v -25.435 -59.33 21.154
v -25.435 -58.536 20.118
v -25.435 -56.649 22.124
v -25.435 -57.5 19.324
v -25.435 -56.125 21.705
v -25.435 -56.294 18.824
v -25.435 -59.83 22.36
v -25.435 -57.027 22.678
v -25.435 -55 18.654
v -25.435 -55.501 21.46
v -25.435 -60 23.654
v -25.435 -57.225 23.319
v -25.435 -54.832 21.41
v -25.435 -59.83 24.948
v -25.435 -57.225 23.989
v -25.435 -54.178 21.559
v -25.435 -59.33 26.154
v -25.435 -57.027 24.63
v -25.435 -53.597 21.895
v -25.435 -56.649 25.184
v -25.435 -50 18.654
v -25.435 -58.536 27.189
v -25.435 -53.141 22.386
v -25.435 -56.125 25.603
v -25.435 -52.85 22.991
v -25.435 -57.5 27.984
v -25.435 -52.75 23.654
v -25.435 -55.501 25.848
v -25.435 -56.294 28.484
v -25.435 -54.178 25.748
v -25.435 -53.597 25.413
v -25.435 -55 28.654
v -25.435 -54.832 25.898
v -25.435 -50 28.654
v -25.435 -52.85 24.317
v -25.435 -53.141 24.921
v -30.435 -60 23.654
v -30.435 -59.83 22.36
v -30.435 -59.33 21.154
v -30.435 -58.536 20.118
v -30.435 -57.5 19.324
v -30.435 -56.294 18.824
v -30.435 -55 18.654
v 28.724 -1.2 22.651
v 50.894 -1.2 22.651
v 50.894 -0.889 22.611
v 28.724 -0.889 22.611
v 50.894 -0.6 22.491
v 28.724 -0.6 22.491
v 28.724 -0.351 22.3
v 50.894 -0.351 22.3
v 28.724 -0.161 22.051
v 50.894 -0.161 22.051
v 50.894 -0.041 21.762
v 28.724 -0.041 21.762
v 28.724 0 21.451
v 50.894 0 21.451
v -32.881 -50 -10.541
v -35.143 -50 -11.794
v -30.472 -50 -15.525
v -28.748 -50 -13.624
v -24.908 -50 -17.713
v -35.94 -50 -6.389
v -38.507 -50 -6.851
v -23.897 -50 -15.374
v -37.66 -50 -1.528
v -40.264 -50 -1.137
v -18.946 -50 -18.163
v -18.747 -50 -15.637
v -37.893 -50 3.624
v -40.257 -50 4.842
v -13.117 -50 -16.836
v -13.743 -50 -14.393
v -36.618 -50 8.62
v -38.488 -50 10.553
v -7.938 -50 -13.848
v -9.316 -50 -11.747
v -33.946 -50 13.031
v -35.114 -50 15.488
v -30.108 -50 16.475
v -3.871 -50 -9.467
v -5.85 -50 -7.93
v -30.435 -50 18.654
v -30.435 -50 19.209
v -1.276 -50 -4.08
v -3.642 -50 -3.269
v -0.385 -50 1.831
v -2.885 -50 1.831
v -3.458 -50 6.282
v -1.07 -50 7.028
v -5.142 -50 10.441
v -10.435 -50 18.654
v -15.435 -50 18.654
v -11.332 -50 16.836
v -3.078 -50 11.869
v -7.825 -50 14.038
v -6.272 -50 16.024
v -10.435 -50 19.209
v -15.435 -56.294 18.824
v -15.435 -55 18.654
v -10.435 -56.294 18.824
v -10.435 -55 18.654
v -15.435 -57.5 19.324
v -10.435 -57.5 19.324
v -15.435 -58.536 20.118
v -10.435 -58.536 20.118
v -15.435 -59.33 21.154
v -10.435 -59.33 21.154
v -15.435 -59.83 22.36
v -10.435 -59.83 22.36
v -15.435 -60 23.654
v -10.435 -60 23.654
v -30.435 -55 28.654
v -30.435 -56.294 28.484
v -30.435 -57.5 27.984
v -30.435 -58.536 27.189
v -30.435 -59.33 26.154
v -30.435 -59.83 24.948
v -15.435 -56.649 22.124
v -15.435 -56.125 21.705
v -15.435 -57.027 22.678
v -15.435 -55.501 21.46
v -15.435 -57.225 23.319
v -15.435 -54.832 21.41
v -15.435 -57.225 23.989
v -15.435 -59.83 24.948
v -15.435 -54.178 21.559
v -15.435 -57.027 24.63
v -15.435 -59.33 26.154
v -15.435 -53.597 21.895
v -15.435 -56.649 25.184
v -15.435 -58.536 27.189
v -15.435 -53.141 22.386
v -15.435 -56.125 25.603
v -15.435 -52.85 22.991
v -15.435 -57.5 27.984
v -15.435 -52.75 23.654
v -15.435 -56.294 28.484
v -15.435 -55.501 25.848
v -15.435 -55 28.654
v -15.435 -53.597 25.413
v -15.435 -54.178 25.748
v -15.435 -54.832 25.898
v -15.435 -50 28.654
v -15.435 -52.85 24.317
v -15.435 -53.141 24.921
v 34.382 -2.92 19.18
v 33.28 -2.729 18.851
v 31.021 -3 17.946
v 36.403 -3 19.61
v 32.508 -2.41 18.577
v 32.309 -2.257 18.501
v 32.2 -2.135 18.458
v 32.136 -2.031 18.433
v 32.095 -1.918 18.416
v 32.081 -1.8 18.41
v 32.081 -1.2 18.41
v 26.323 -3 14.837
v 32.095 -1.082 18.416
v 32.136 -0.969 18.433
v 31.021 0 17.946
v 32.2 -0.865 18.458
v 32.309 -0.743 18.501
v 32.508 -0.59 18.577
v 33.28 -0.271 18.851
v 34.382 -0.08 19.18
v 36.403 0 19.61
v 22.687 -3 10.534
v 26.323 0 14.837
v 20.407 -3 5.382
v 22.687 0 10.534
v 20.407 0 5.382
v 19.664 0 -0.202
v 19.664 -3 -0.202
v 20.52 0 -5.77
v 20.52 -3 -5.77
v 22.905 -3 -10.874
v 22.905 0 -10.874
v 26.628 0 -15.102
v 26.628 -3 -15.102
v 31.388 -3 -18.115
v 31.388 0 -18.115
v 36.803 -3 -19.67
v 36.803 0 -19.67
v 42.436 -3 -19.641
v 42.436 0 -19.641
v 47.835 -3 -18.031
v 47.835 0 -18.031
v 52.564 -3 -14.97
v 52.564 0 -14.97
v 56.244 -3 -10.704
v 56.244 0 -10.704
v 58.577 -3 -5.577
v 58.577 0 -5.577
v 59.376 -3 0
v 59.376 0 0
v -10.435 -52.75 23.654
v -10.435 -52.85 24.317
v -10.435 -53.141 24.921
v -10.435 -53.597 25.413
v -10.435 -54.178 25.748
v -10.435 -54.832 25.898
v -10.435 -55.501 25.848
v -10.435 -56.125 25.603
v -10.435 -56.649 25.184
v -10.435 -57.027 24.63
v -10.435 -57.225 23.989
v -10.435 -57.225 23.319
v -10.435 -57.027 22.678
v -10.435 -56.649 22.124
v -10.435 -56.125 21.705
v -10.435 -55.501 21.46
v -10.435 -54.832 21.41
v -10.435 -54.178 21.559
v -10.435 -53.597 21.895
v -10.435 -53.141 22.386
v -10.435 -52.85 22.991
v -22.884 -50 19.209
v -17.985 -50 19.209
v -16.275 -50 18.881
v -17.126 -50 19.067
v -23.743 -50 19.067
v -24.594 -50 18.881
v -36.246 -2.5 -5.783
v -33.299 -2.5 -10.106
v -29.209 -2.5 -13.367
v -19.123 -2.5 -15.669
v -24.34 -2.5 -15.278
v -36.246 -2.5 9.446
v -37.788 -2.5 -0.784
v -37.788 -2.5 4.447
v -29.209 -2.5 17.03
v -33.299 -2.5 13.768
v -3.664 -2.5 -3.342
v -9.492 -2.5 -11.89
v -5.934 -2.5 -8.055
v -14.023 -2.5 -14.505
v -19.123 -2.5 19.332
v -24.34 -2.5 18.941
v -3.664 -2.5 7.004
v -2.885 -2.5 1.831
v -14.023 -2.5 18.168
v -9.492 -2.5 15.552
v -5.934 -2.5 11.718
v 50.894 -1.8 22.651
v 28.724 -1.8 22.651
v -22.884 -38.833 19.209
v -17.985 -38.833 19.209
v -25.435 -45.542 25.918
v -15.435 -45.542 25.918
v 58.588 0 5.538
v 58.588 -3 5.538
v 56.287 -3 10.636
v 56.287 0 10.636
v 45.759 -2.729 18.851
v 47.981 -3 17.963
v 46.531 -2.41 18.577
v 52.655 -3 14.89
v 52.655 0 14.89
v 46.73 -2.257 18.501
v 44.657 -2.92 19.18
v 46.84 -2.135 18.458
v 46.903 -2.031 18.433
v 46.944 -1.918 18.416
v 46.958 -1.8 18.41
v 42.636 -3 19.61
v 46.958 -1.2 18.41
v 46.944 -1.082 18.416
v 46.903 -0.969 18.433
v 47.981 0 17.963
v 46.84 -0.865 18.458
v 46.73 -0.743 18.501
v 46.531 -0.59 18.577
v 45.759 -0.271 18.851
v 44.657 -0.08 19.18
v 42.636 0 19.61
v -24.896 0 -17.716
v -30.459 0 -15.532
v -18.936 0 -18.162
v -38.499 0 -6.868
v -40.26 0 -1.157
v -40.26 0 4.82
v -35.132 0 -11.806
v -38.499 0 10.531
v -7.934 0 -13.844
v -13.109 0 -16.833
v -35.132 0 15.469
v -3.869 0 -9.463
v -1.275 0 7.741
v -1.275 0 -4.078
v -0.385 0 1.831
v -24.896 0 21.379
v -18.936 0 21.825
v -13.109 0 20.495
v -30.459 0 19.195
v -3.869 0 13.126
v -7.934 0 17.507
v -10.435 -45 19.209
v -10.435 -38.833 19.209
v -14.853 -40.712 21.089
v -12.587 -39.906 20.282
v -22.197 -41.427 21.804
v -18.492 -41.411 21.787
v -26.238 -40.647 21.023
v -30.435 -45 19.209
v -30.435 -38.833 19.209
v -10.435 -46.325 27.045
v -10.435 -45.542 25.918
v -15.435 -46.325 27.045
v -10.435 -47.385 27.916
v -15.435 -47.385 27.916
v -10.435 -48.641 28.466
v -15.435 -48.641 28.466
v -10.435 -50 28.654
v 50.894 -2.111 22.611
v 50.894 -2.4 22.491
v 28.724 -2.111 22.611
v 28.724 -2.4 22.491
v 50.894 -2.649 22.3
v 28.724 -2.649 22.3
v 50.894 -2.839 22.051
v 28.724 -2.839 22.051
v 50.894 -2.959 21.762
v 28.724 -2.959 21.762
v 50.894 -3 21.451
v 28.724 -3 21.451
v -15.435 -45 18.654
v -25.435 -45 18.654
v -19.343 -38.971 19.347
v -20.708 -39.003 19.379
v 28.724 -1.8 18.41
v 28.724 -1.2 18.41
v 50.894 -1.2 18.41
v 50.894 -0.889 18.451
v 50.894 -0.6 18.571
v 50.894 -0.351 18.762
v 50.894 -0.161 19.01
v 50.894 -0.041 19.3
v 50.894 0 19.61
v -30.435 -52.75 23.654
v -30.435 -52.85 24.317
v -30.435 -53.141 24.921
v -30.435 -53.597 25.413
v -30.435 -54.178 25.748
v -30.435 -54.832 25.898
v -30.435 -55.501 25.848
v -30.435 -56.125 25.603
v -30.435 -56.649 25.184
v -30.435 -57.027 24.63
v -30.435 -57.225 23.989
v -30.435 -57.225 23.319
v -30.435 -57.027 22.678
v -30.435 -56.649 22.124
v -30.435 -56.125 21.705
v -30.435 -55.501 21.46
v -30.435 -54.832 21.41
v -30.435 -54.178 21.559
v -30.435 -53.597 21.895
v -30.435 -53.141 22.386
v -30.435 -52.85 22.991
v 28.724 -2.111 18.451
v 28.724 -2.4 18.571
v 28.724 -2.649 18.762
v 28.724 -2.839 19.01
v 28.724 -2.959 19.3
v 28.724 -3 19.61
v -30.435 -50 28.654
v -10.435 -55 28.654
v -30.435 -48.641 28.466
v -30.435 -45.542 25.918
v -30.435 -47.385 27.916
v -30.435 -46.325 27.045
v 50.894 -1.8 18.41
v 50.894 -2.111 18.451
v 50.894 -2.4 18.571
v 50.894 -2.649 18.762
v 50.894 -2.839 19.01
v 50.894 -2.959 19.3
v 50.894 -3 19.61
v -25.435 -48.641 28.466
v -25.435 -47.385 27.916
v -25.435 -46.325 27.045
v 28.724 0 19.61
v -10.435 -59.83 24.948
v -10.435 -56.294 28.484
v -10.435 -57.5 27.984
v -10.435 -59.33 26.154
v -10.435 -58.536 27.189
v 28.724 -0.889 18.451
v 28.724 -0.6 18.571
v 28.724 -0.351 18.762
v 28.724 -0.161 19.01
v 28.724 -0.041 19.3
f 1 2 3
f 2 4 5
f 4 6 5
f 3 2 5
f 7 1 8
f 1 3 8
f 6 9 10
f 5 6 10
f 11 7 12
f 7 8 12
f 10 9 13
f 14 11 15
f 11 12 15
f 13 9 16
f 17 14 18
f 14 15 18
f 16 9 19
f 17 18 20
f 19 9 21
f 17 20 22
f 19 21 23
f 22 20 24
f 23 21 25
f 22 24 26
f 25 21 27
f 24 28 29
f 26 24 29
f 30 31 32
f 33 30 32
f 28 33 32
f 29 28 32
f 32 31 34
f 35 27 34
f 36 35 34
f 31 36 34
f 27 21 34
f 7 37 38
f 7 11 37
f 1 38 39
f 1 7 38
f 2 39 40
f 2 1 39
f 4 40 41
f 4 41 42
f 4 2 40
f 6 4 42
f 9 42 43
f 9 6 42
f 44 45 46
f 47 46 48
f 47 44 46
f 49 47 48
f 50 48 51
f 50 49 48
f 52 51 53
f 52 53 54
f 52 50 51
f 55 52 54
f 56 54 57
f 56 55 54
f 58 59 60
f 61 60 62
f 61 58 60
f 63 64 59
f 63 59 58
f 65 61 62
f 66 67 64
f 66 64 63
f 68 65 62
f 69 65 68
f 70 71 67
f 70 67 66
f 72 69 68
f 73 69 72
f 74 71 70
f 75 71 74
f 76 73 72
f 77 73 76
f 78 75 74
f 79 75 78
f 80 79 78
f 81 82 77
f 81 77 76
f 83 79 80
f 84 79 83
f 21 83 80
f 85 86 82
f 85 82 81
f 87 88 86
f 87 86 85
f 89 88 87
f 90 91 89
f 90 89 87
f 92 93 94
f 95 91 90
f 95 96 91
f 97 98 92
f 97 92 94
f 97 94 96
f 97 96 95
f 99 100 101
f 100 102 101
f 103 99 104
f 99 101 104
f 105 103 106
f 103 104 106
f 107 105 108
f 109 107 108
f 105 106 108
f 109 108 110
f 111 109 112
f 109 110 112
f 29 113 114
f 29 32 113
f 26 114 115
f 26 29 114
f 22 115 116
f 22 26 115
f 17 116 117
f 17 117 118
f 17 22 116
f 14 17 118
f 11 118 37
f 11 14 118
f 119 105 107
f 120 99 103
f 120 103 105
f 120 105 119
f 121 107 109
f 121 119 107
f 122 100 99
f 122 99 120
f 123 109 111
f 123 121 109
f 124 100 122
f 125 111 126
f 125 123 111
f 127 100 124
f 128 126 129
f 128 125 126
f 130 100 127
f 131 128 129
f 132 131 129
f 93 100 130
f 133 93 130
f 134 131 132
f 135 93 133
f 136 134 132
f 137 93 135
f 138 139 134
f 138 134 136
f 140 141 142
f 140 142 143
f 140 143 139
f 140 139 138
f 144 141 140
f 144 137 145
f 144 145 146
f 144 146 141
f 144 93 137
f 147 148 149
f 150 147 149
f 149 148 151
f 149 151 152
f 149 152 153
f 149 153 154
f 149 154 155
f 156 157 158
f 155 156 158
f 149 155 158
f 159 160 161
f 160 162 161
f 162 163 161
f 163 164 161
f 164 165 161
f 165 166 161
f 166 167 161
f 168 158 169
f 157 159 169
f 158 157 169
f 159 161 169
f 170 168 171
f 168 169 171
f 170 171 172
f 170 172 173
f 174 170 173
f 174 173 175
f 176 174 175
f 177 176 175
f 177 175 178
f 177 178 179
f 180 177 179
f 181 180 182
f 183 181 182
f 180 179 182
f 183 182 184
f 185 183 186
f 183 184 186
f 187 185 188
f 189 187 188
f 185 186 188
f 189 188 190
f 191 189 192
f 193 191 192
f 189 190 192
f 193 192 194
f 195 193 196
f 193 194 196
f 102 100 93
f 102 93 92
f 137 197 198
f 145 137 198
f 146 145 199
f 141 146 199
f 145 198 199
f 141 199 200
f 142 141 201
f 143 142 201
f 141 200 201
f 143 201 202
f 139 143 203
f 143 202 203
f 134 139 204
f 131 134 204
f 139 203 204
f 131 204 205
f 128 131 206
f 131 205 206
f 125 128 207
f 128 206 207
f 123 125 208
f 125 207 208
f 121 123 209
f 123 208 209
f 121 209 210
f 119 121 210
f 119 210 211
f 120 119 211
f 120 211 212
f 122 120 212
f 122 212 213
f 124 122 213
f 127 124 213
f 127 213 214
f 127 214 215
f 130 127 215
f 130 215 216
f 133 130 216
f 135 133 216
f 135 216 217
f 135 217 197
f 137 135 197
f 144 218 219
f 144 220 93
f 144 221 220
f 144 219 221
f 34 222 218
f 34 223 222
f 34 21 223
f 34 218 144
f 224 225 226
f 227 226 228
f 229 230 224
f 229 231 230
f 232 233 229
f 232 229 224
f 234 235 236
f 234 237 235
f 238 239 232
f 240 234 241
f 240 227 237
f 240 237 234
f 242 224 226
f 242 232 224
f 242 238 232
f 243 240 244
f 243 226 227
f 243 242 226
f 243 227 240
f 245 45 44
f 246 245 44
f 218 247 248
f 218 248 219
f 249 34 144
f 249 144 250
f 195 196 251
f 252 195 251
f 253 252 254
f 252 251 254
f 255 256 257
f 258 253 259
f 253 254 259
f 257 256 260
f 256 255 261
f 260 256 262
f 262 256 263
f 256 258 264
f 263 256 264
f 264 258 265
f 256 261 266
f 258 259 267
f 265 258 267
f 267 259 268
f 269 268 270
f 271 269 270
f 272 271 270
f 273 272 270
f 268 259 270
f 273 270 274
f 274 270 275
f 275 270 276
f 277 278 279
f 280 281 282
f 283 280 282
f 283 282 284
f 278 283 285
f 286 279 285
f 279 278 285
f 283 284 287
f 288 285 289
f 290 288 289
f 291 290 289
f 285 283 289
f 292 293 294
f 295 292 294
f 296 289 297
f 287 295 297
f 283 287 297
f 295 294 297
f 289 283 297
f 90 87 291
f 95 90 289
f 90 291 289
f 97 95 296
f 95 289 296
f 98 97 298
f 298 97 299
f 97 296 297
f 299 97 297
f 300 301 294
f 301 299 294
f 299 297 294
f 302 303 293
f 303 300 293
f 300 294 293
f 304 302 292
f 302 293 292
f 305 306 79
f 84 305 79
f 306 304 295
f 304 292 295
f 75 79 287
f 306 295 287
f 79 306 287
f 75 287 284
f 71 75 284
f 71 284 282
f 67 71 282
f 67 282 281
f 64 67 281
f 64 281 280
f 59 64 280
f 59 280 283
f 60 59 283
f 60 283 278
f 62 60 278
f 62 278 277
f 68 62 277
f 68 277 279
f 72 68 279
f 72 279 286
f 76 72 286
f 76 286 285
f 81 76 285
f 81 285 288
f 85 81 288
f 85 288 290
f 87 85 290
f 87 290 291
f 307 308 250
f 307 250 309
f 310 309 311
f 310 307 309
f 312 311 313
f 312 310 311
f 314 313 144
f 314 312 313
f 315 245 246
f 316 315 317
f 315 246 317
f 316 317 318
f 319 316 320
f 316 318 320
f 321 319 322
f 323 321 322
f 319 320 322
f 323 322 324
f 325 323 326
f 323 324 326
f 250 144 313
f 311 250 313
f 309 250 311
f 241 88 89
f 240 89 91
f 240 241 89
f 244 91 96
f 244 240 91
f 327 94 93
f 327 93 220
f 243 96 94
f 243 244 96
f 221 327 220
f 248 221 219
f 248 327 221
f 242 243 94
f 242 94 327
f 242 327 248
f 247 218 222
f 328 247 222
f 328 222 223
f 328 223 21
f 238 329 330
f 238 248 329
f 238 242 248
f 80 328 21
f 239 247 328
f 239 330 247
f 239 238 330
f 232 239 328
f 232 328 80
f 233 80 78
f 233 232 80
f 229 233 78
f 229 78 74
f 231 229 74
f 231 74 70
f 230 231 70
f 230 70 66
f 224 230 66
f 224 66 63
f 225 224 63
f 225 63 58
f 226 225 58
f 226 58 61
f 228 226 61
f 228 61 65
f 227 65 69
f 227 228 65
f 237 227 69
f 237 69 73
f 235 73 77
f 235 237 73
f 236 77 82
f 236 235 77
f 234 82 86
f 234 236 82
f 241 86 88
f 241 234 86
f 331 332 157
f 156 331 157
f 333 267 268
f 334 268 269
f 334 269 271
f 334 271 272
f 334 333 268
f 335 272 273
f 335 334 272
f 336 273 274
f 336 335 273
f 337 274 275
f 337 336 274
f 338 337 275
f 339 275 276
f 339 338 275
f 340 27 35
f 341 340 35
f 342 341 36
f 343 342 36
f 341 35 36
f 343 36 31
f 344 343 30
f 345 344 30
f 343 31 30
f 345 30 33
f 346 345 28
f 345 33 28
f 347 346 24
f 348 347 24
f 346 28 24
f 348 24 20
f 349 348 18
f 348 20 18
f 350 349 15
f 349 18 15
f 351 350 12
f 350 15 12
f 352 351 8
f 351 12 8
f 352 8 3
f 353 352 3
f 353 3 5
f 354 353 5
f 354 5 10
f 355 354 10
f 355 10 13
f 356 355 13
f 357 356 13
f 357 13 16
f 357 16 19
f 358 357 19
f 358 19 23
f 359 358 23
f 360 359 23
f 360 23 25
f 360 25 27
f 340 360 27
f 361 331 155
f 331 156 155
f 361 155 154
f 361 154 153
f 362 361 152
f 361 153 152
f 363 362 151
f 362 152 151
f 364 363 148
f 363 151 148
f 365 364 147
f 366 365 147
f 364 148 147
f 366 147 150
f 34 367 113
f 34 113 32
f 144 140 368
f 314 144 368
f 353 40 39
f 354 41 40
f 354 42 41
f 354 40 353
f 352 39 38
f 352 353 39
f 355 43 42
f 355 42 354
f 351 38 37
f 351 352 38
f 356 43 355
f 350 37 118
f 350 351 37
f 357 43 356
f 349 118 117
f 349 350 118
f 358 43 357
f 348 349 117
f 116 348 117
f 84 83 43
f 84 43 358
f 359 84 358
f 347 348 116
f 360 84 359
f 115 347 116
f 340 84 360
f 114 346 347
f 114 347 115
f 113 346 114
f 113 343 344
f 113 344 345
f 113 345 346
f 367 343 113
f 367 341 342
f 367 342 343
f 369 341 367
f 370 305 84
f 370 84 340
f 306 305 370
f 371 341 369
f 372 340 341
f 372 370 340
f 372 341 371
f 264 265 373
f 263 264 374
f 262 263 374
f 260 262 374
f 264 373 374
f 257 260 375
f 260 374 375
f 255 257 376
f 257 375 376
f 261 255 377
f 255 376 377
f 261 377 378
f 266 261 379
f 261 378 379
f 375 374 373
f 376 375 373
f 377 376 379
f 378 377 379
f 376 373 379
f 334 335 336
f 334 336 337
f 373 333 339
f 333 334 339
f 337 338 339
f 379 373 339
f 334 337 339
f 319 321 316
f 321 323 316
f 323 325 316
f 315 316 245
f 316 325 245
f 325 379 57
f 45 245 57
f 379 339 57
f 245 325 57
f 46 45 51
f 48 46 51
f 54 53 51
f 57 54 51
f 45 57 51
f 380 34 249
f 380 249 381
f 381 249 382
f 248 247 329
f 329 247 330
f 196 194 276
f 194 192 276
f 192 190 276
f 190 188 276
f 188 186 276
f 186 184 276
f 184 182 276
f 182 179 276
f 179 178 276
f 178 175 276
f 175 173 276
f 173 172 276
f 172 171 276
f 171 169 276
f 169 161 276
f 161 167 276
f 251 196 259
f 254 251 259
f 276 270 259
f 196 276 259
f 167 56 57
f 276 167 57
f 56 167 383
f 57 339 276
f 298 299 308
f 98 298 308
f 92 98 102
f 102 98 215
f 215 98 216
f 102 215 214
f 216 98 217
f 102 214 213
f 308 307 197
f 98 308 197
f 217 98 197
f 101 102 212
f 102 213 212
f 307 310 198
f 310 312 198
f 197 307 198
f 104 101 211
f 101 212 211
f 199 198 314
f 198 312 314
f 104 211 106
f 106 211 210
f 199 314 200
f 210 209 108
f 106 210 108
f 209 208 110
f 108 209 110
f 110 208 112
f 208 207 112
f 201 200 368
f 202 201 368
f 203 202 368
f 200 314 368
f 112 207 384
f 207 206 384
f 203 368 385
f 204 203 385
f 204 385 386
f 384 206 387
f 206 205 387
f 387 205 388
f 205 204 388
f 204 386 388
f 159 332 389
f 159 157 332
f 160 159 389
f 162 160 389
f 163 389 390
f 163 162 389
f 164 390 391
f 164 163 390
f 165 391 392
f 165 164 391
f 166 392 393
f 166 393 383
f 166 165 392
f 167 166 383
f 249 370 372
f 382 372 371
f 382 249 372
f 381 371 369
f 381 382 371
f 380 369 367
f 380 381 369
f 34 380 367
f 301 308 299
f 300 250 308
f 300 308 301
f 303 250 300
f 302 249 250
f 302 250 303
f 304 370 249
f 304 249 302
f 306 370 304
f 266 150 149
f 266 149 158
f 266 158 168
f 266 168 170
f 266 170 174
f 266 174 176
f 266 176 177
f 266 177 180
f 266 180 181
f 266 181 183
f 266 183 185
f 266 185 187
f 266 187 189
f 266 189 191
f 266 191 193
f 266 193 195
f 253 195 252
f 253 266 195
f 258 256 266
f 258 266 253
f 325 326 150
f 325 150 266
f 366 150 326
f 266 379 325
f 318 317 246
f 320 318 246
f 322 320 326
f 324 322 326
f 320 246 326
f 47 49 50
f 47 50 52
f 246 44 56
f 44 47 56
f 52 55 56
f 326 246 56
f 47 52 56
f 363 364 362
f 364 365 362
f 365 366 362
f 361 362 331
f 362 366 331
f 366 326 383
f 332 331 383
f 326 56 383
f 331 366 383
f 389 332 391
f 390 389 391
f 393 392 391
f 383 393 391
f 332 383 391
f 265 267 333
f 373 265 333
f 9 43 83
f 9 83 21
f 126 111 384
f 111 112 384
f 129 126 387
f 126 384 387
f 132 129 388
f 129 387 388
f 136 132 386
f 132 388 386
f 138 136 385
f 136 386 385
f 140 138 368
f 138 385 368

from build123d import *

# Parameters (mm, degrees)
F0_R      = 20.0498878018
F1_DEPTH  = 50
F2_T      = -2.5
F4_W      = 5
F4_H      = 10
F5_DEPTH  = 15
F6_R      = 4.99999
F8_D      = 4.5
F10_DEPTH = 3
F11_R     = 1.2
F13_DEPTH = 20


# Not quite as in the source:
# - a fillet or chamfer is up to 0.001 mm smaller than in the source, because OpenCascade refuses the exact size


with BuildPart() as f1:
    # F0 (on Front) → F1 (new body)
    with BuildSketch(Plane.XZ):
        with Locations((-20.4345174134, 1.8313954351)):
            Circle(F0_R)
    extrude(amount=F1_DEPTH)

    # F2
    f2_openings = [f1.faces().sort_by_distance(p)[0] for p in [
        (-20.434517, -50, 1.831395),
    ]]
    offset(amount=F2_T, openings=f2_openings)

    # F4 (on offset) → F5 (join)
    with BuildSketch(Plane.XZ.offset(45)):
        with Locations((-27.9345174134, 23.653956532)):
            Rectangle(F4_W, F4_H)
        with Locations((-12.9345174134, 23.653956532)):
            Rectangle(F4_W, F4_H)
    extrude(amount=F5_DEPTH)

    # F6 (radius 5 in the source; OpenCascade refuses exactly that, so slightly less here)
    f6_edges = [f1.edges().sort_by_distance(p)[0] for p in [
        (-12.934517, -45, 28.653957),
        (-27.934517, -45, 28.653957),
        (-27.934517, -60, 18.653957),
        (-12.934517, -60, 18.653957),
        (-12.934517, -60, 28.653957),
        (-27.934517, -60, 28.653957),
    ]]
    fillet(f6_edges, radius=F6_R)

    # F8 (through all)
    with Locations(Plane(origin=(-30.4345174134, 0, 0), x_dir=(0, -1, 0), z_dir=(-1, 0, 0))):
        with Locations((55, 23.653956532)):
            Hole(F8_D / 2)

    # F12 (on face) → F13 (join, through all)
    with BuildSketch(Plane(origin=(-30.4345174134, 0, 0), x_dir=(0, -1, 0), z_dir=(-1, 0, 0))):
        Polygon((38.8332865942, 19.2094851134), (45, 19.2094851134), (45.5421266796, 25.9183251988), align=None)
        Polygon((45.5421266796, 25.9183251988), (45, 19.2094851134), (50, 19.2094851134), (50, 28.653956532), align=None)
    extrude(amount=-F13_DEPTH)


with BuildPart() as f10:
    # F9 (on Front) → F10 (new body)
    with BuildSketch(Plane.XZ):
        with BuildLine():
            ThreePointArc((32.0807376184, 18.4103436768), (39.519585669, 19.8564149488), (46.9584337196, 18.4103436768))
            Line((46.9584337196, 18.4103436768), (50.8935190737, 18.4103436768))
            Line((50.8935190737, 18.4103436768), (50.8935190737, 22.6514711976))
            Line((50.8935190737, 22.6514711976), (28.72399427, 22.6514711976))
            Line((28.72399427, 22.6514711976), (28.72399427, 18.4103436768))
            Line((28.72399427, 18.4103436768), (32.0807376184, 18.4103436768))
        make_face()
        with BuildLine():
            ThreePointArc((32.0807376184, 18.4103436768), (28.4162447082, -16.4618660584), (59.3760006178, 0))
            ThreePointArc((59.3760006178, 0), (55.9814517275, 11.1033409608), (46.9584337196, 18.4103436768))
            Line((46.9584337196, 18.4103436768), (32.0807376184, 18.4103436768))
        make_face()
        with BuildLine():
            Line((32.0807376184, 18.4103436768), (46.9584337196, 18.4103436768))
            ThreePointArc((46.9584337196, 18.4103436768), (39.519585669, 19.8564149488), (32.0807376184, 18.4103436768))
        make_face()
    extrude(amount=F10_DEPTH)

    # F11
    f11_edges = [f10.edges().sort_by_distance(p)[0] for p in [
        (39.808757, 0, 22.651471),
        (39.808757, -3, 22.651471),
        (30.402366, 0, 18.410344),
        (48.925976, 0, 18.410344),
        (48.925976, -3, 18.410344),
        (30.402366, -3, 18.410344),
    ]]
    fillet(f11_edges, radius=F11_R)


solid = Compound([f1.part, f10.part])
